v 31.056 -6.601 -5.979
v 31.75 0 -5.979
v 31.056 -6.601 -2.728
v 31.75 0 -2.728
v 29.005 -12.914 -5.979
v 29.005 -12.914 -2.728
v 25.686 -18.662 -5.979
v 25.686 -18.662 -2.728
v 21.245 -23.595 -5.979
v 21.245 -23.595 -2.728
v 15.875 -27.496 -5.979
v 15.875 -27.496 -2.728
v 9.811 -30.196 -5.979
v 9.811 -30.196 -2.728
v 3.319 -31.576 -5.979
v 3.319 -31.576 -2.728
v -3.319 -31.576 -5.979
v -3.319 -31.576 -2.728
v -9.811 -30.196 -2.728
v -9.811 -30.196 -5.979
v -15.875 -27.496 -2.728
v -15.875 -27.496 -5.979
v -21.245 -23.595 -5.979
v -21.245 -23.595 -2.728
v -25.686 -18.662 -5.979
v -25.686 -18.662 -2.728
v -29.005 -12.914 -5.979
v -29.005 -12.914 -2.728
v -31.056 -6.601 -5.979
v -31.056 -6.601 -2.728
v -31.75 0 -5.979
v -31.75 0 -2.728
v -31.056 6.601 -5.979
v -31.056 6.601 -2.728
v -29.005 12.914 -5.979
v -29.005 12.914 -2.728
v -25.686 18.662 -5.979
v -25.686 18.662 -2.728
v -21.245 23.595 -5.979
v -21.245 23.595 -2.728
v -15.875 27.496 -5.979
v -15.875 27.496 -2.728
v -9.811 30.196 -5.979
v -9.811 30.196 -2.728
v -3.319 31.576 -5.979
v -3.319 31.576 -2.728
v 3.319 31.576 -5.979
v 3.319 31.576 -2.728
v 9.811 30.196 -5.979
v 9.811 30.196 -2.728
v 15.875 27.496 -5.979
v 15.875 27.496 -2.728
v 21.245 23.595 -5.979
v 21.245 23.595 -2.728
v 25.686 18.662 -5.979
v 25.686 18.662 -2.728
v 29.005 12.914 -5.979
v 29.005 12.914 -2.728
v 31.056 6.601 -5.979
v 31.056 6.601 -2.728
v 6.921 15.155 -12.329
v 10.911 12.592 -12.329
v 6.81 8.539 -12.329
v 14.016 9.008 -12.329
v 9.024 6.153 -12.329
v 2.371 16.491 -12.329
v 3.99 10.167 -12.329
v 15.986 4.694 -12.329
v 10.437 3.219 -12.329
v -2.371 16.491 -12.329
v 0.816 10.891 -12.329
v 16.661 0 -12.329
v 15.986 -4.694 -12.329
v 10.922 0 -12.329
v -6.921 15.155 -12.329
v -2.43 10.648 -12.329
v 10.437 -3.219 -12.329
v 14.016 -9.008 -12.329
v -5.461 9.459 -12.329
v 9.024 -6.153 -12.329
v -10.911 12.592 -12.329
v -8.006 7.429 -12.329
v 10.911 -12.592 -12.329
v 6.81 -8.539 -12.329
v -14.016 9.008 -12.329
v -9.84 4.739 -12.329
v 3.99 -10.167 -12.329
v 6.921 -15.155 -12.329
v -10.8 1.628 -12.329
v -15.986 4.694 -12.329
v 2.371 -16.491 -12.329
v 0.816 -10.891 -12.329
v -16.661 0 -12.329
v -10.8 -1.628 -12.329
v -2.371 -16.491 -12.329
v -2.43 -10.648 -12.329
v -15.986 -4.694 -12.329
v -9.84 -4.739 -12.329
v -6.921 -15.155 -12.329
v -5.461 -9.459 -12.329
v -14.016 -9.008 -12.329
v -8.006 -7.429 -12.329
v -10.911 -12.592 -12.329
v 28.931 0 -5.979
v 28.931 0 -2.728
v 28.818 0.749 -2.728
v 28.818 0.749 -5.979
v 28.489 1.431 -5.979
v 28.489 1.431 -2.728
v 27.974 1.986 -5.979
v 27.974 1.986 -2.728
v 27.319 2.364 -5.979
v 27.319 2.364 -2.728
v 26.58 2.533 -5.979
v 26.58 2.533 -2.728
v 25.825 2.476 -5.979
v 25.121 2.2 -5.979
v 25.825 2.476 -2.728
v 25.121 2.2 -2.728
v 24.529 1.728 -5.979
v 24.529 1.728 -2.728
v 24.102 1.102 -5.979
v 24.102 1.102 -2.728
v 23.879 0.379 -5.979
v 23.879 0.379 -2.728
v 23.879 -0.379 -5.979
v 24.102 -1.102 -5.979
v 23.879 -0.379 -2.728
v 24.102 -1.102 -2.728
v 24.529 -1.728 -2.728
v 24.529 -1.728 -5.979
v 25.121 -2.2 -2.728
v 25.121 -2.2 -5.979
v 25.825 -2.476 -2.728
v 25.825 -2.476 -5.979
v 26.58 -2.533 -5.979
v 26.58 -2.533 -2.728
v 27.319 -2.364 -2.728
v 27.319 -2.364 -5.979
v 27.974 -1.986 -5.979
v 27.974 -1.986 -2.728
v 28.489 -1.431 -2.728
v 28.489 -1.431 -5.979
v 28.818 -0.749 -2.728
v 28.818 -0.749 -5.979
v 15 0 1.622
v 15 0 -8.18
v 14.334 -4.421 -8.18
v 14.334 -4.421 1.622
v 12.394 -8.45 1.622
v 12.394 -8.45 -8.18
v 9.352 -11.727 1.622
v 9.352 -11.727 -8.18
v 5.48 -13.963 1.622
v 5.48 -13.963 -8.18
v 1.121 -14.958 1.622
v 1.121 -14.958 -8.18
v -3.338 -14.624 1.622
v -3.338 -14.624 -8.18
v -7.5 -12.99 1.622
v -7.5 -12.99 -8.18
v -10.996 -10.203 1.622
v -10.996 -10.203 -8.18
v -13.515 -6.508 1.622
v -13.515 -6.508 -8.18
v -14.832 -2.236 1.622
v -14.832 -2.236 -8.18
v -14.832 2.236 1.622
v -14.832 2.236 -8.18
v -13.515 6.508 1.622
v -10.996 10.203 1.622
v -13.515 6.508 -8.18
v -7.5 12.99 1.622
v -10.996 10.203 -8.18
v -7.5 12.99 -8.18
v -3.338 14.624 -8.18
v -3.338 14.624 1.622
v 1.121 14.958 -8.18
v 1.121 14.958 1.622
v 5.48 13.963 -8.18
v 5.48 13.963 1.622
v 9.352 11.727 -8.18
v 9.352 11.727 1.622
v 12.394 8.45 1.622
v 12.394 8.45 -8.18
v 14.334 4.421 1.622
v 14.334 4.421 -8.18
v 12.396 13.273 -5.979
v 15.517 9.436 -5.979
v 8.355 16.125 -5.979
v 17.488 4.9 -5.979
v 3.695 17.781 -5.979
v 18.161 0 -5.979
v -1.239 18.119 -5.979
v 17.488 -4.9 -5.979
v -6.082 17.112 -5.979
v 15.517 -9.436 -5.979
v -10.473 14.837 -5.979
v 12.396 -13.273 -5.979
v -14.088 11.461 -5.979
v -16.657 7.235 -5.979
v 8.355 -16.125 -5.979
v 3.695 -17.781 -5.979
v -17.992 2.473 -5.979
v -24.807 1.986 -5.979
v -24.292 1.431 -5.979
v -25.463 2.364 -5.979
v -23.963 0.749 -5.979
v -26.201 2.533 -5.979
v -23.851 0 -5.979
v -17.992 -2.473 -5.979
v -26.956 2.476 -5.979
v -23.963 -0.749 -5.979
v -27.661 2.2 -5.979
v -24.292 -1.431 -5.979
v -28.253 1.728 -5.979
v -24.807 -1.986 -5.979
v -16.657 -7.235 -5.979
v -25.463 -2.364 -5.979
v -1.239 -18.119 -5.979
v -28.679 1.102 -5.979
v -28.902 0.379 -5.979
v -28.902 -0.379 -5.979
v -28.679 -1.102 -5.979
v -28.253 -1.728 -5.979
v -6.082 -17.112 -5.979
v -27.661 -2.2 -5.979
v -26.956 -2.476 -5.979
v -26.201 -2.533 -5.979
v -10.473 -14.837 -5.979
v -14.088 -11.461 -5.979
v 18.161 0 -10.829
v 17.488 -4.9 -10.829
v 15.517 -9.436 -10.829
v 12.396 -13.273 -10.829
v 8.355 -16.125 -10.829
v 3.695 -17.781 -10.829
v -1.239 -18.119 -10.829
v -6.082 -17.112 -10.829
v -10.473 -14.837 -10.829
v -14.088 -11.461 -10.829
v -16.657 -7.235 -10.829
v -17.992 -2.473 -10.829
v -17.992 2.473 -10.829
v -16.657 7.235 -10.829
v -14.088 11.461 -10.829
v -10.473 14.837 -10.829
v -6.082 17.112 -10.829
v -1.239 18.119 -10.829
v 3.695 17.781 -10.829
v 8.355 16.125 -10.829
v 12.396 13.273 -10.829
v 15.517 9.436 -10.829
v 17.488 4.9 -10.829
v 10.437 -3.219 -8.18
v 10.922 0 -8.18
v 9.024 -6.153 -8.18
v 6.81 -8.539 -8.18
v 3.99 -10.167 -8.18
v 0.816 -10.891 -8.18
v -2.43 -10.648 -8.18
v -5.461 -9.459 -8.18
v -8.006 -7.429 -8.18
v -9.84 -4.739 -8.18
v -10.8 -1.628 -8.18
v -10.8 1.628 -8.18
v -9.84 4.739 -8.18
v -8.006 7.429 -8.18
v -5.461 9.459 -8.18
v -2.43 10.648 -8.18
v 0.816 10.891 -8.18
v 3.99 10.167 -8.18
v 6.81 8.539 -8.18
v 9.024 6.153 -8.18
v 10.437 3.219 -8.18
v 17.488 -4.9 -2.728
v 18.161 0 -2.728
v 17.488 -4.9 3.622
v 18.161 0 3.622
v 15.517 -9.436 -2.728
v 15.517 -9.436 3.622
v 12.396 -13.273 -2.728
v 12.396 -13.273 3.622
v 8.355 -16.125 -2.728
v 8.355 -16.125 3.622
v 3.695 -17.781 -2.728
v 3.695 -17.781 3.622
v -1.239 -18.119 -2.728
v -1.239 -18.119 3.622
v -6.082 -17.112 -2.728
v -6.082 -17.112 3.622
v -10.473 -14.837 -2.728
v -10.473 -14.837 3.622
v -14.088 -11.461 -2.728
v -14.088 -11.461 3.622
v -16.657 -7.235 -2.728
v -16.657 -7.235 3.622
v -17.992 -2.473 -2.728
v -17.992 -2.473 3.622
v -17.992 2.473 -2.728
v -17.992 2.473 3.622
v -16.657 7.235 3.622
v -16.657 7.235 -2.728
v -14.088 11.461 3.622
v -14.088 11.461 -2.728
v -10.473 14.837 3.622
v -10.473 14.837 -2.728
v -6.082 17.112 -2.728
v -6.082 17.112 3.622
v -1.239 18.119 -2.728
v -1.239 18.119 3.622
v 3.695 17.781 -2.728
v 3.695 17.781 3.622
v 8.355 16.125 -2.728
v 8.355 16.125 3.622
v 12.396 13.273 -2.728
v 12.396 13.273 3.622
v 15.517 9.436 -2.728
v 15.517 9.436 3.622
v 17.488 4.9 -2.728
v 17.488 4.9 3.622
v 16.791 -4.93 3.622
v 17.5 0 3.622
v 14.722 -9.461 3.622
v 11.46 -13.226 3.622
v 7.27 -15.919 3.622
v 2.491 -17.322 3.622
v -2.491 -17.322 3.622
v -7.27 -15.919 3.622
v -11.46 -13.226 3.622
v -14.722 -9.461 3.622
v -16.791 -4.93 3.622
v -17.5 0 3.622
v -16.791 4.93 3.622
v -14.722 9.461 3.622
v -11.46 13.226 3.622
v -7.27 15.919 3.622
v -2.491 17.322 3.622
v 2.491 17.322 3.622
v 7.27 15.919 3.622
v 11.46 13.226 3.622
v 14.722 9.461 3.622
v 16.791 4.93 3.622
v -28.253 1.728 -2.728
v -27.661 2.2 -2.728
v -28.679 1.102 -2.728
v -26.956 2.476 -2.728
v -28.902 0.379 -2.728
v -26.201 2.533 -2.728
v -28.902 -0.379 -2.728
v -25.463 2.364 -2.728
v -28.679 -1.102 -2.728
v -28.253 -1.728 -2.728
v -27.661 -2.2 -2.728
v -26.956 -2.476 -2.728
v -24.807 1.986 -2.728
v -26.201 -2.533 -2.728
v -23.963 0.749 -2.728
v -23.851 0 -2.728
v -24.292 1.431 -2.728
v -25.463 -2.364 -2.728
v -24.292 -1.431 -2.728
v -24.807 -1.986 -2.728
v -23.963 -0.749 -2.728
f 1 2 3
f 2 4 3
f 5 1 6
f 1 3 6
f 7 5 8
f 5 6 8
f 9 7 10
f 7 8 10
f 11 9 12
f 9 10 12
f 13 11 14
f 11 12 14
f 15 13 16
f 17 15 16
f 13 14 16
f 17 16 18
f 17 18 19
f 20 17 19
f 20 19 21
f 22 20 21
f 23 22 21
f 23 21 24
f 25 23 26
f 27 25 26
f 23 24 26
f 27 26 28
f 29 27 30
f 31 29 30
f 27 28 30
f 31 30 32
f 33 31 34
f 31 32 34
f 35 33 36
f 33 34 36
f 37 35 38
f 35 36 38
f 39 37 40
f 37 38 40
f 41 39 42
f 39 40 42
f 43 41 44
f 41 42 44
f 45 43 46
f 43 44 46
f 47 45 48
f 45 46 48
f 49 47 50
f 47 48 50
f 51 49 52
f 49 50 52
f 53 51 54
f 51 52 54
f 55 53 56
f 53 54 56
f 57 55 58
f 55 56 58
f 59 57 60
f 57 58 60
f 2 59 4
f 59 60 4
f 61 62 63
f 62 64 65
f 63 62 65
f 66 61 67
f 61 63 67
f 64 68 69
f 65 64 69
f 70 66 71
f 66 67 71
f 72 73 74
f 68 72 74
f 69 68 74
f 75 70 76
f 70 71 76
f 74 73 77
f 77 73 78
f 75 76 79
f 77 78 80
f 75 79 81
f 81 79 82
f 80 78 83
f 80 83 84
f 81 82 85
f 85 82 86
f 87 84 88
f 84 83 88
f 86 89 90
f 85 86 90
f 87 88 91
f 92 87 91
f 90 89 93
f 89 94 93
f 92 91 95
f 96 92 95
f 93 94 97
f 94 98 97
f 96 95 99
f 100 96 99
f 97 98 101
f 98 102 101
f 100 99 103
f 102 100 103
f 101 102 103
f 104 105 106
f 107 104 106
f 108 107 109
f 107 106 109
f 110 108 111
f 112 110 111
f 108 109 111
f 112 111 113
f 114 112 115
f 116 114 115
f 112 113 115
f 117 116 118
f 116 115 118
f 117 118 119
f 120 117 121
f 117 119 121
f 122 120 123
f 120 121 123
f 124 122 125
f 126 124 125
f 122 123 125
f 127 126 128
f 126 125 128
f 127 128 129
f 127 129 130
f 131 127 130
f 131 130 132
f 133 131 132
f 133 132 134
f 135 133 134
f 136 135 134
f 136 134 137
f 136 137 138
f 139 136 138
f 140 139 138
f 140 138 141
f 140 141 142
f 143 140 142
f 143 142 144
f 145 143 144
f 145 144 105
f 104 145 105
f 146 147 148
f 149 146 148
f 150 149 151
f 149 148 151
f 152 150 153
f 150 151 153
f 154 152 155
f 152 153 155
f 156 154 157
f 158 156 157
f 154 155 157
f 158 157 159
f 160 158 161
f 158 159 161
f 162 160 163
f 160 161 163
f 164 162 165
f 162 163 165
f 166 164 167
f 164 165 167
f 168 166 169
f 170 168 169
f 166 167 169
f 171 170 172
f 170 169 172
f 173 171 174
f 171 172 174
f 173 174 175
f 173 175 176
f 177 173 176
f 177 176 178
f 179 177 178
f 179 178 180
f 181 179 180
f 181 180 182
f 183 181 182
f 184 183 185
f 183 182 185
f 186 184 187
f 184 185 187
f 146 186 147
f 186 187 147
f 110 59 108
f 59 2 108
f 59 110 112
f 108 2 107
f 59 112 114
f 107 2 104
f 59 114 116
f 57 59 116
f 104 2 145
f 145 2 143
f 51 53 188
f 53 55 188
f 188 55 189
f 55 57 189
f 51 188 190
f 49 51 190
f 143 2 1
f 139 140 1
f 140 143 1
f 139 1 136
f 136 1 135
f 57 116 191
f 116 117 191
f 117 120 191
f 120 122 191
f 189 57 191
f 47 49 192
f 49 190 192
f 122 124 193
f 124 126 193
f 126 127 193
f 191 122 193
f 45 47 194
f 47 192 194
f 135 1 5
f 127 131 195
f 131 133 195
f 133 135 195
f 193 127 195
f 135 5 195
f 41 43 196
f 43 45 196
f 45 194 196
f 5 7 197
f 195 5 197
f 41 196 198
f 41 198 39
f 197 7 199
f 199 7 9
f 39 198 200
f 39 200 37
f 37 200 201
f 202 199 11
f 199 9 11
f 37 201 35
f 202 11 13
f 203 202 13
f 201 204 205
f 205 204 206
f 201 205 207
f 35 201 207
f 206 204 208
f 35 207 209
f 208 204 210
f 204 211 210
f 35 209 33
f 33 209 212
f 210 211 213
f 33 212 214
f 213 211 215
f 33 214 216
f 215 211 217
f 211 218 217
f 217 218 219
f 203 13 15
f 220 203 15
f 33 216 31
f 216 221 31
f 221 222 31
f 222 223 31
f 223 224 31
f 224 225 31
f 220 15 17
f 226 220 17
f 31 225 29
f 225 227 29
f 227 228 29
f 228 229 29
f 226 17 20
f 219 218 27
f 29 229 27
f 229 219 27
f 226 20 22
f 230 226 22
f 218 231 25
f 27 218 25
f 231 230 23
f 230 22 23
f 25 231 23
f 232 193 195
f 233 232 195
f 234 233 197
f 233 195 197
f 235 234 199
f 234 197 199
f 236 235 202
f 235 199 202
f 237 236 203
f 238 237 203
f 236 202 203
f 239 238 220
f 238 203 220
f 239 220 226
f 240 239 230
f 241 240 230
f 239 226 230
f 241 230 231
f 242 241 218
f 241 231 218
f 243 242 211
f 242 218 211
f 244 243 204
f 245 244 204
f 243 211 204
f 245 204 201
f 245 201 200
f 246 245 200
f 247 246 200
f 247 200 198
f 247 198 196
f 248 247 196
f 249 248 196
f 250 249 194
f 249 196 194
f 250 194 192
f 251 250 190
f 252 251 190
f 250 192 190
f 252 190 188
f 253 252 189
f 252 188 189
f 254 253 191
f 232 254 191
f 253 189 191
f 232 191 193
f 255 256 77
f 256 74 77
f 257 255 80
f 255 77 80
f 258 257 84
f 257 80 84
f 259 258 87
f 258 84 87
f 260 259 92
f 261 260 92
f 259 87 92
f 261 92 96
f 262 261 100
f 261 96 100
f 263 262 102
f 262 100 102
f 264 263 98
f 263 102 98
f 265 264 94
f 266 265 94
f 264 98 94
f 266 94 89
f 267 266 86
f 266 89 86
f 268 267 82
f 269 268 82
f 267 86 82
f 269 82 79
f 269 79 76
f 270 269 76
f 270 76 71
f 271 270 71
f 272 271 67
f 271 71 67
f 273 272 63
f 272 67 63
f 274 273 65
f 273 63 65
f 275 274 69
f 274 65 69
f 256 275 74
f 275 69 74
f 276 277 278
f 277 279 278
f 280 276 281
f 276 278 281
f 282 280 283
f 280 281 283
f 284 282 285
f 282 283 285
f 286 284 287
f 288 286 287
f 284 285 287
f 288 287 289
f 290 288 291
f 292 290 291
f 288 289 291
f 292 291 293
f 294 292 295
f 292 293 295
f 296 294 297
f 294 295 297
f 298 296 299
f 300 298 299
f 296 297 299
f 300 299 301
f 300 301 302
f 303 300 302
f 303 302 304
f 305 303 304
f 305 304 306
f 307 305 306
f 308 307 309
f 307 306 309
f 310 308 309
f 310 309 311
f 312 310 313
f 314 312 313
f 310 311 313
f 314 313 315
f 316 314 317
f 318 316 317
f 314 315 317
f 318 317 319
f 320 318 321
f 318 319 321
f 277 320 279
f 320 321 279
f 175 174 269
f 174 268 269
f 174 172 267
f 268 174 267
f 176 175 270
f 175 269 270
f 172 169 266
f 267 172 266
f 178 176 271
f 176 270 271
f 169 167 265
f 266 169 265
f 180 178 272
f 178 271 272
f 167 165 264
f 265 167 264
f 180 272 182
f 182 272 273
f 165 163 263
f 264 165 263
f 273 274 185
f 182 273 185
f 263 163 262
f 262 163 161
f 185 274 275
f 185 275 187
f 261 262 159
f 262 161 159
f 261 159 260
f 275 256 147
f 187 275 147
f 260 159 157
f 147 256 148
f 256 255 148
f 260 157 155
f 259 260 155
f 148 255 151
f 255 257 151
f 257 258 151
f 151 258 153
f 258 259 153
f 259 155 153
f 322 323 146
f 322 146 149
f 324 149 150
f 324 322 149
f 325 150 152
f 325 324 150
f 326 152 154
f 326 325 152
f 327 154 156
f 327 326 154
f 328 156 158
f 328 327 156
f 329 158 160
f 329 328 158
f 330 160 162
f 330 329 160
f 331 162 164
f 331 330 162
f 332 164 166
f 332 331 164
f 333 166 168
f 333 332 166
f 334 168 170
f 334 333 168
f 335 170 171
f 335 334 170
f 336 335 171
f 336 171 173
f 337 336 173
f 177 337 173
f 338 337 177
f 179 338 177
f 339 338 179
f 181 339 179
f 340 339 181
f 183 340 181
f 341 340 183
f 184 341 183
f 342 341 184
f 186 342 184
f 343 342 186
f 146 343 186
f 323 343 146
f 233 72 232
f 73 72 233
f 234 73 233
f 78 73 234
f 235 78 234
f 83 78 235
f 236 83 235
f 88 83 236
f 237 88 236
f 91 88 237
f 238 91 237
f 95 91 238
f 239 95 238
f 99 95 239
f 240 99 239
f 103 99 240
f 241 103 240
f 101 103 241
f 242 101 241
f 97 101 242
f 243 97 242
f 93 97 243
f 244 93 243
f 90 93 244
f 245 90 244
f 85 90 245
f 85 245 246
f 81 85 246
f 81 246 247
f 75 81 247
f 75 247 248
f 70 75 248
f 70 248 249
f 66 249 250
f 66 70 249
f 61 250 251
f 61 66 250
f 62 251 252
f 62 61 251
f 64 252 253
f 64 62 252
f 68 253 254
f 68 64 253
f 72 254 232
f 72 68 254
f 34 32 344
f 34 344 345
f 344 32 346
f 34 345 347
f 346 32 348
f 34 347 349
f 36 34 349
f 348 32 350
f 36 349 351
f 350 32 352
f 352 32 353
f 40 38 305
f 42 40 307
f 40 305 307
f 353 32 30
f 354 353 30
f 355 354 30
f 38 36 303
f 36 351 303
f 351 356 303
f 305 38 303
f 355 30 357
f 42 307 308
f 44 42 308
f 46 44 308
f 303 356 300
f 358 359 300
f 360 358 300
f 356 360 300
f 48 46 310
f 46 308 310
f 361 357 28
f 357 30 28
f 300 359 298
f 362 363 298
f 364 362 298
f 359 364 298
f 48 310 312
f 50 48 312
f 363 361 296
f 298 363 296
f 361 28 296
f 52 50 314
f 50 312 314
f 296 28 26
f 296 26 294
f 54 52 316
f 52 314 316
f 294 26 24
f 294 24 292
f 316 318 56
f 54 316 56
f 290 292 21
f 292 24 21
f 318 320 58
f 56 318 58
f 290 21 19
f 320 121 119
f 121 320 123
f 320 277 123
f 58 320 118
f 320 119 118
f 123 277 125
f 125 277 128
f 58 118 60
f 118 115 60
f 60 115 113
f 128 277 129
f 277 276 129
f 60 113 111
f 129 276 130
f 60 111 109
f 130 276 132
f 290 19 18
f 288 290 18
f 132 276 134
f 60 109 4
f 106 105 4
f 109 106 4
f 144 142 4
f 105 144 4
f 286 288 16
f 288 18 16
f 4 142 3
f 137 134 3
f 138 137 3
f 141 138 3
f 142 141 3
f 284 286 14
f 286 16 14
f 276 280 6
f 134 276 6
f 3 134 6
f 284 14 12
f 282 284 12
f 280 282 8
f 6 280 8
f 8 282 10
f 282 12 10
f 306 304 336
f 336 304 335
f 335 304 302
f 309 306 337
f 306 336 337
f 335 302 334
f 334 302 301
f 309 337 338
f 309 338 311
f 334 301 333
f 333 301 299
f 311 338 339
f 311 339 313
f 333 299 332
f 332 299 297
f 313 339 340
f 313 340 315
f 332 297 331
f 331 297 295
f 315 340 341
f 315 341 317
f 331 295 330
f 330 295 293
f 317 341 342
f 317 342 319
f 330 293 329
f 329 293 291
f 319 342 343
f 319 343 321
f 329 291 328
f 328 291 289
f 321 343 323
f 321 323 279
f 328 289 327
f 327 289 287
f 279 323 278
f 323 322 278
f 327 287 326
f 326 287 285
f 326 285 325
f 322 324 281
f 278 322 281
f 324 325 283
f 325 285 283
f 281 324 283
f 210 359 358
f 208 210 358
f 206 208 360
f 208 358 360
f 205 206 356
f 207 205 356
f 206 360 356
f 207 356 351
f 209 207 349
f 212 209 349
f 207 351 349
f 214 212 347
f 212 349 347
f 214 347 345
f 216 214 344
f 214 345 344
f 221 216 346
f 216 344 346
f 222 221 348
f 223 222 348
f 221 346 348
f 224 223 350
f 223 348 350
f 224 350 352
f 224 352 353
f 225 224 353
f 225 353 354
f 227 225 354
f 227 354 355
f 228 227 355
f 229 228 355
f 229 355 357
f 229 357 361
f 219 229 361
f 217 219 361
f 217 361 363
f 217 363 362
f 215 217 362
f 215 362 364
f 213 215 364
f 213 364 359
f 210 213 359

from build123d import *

# Parameters (mm, degrees)
F2_R     = 2.54
F3_DEPTH = 9.6022
F4_SIZE  = 1.5
F5_SIZE2 = 2.5
F5_SIZE  = 2


with BuildPart() as f1:
    # F0 (on Front) → F1 (revolve)
    with BuildSketch(Plane.XZ):
        Polygon((31.75, -5.978718), (31.75, -2.727518), (18.161, -2.727518), (18.161, 3.622482), (15, 3.622482), (15, -8.179607), (10.922, -8.179607), (10.922, -12.328718), (18.161, -12.328718), (18.161, -5.978718), align=None)
    revolve(axis=Axis((0, 0, -5.153181), (0, 0, -1)))

    # F2 (on face) → F3 (cut, through all)
    with BuildSketch(Plane.XY.offset(-2.727518)):
        with Locations((26.3906, 0)):
            Circle(F2_R)
        with Locations((-26.3906, 0)):
            Circle(F2_R)
    extrude(amount=-F3_DEPTH, mode=Mode.SUBTRACT)

    # F4
    f4_edges = [f1.edges().sort_by_distance(p)[0] for p in [
        (-18.161, 0, -12.328718),
    ]]
    chamfer(f4_edges, length=F4_SIZE)

    # F5
    f5_edges = [f1.edges().sort_by_distance(p)[0] for p in [
        (-15, 0, 3.622482),
    ]]
    chamfer(f5_edges, length=F5_SIZE, length2=F5_SIZE2)


solid = f1.part
